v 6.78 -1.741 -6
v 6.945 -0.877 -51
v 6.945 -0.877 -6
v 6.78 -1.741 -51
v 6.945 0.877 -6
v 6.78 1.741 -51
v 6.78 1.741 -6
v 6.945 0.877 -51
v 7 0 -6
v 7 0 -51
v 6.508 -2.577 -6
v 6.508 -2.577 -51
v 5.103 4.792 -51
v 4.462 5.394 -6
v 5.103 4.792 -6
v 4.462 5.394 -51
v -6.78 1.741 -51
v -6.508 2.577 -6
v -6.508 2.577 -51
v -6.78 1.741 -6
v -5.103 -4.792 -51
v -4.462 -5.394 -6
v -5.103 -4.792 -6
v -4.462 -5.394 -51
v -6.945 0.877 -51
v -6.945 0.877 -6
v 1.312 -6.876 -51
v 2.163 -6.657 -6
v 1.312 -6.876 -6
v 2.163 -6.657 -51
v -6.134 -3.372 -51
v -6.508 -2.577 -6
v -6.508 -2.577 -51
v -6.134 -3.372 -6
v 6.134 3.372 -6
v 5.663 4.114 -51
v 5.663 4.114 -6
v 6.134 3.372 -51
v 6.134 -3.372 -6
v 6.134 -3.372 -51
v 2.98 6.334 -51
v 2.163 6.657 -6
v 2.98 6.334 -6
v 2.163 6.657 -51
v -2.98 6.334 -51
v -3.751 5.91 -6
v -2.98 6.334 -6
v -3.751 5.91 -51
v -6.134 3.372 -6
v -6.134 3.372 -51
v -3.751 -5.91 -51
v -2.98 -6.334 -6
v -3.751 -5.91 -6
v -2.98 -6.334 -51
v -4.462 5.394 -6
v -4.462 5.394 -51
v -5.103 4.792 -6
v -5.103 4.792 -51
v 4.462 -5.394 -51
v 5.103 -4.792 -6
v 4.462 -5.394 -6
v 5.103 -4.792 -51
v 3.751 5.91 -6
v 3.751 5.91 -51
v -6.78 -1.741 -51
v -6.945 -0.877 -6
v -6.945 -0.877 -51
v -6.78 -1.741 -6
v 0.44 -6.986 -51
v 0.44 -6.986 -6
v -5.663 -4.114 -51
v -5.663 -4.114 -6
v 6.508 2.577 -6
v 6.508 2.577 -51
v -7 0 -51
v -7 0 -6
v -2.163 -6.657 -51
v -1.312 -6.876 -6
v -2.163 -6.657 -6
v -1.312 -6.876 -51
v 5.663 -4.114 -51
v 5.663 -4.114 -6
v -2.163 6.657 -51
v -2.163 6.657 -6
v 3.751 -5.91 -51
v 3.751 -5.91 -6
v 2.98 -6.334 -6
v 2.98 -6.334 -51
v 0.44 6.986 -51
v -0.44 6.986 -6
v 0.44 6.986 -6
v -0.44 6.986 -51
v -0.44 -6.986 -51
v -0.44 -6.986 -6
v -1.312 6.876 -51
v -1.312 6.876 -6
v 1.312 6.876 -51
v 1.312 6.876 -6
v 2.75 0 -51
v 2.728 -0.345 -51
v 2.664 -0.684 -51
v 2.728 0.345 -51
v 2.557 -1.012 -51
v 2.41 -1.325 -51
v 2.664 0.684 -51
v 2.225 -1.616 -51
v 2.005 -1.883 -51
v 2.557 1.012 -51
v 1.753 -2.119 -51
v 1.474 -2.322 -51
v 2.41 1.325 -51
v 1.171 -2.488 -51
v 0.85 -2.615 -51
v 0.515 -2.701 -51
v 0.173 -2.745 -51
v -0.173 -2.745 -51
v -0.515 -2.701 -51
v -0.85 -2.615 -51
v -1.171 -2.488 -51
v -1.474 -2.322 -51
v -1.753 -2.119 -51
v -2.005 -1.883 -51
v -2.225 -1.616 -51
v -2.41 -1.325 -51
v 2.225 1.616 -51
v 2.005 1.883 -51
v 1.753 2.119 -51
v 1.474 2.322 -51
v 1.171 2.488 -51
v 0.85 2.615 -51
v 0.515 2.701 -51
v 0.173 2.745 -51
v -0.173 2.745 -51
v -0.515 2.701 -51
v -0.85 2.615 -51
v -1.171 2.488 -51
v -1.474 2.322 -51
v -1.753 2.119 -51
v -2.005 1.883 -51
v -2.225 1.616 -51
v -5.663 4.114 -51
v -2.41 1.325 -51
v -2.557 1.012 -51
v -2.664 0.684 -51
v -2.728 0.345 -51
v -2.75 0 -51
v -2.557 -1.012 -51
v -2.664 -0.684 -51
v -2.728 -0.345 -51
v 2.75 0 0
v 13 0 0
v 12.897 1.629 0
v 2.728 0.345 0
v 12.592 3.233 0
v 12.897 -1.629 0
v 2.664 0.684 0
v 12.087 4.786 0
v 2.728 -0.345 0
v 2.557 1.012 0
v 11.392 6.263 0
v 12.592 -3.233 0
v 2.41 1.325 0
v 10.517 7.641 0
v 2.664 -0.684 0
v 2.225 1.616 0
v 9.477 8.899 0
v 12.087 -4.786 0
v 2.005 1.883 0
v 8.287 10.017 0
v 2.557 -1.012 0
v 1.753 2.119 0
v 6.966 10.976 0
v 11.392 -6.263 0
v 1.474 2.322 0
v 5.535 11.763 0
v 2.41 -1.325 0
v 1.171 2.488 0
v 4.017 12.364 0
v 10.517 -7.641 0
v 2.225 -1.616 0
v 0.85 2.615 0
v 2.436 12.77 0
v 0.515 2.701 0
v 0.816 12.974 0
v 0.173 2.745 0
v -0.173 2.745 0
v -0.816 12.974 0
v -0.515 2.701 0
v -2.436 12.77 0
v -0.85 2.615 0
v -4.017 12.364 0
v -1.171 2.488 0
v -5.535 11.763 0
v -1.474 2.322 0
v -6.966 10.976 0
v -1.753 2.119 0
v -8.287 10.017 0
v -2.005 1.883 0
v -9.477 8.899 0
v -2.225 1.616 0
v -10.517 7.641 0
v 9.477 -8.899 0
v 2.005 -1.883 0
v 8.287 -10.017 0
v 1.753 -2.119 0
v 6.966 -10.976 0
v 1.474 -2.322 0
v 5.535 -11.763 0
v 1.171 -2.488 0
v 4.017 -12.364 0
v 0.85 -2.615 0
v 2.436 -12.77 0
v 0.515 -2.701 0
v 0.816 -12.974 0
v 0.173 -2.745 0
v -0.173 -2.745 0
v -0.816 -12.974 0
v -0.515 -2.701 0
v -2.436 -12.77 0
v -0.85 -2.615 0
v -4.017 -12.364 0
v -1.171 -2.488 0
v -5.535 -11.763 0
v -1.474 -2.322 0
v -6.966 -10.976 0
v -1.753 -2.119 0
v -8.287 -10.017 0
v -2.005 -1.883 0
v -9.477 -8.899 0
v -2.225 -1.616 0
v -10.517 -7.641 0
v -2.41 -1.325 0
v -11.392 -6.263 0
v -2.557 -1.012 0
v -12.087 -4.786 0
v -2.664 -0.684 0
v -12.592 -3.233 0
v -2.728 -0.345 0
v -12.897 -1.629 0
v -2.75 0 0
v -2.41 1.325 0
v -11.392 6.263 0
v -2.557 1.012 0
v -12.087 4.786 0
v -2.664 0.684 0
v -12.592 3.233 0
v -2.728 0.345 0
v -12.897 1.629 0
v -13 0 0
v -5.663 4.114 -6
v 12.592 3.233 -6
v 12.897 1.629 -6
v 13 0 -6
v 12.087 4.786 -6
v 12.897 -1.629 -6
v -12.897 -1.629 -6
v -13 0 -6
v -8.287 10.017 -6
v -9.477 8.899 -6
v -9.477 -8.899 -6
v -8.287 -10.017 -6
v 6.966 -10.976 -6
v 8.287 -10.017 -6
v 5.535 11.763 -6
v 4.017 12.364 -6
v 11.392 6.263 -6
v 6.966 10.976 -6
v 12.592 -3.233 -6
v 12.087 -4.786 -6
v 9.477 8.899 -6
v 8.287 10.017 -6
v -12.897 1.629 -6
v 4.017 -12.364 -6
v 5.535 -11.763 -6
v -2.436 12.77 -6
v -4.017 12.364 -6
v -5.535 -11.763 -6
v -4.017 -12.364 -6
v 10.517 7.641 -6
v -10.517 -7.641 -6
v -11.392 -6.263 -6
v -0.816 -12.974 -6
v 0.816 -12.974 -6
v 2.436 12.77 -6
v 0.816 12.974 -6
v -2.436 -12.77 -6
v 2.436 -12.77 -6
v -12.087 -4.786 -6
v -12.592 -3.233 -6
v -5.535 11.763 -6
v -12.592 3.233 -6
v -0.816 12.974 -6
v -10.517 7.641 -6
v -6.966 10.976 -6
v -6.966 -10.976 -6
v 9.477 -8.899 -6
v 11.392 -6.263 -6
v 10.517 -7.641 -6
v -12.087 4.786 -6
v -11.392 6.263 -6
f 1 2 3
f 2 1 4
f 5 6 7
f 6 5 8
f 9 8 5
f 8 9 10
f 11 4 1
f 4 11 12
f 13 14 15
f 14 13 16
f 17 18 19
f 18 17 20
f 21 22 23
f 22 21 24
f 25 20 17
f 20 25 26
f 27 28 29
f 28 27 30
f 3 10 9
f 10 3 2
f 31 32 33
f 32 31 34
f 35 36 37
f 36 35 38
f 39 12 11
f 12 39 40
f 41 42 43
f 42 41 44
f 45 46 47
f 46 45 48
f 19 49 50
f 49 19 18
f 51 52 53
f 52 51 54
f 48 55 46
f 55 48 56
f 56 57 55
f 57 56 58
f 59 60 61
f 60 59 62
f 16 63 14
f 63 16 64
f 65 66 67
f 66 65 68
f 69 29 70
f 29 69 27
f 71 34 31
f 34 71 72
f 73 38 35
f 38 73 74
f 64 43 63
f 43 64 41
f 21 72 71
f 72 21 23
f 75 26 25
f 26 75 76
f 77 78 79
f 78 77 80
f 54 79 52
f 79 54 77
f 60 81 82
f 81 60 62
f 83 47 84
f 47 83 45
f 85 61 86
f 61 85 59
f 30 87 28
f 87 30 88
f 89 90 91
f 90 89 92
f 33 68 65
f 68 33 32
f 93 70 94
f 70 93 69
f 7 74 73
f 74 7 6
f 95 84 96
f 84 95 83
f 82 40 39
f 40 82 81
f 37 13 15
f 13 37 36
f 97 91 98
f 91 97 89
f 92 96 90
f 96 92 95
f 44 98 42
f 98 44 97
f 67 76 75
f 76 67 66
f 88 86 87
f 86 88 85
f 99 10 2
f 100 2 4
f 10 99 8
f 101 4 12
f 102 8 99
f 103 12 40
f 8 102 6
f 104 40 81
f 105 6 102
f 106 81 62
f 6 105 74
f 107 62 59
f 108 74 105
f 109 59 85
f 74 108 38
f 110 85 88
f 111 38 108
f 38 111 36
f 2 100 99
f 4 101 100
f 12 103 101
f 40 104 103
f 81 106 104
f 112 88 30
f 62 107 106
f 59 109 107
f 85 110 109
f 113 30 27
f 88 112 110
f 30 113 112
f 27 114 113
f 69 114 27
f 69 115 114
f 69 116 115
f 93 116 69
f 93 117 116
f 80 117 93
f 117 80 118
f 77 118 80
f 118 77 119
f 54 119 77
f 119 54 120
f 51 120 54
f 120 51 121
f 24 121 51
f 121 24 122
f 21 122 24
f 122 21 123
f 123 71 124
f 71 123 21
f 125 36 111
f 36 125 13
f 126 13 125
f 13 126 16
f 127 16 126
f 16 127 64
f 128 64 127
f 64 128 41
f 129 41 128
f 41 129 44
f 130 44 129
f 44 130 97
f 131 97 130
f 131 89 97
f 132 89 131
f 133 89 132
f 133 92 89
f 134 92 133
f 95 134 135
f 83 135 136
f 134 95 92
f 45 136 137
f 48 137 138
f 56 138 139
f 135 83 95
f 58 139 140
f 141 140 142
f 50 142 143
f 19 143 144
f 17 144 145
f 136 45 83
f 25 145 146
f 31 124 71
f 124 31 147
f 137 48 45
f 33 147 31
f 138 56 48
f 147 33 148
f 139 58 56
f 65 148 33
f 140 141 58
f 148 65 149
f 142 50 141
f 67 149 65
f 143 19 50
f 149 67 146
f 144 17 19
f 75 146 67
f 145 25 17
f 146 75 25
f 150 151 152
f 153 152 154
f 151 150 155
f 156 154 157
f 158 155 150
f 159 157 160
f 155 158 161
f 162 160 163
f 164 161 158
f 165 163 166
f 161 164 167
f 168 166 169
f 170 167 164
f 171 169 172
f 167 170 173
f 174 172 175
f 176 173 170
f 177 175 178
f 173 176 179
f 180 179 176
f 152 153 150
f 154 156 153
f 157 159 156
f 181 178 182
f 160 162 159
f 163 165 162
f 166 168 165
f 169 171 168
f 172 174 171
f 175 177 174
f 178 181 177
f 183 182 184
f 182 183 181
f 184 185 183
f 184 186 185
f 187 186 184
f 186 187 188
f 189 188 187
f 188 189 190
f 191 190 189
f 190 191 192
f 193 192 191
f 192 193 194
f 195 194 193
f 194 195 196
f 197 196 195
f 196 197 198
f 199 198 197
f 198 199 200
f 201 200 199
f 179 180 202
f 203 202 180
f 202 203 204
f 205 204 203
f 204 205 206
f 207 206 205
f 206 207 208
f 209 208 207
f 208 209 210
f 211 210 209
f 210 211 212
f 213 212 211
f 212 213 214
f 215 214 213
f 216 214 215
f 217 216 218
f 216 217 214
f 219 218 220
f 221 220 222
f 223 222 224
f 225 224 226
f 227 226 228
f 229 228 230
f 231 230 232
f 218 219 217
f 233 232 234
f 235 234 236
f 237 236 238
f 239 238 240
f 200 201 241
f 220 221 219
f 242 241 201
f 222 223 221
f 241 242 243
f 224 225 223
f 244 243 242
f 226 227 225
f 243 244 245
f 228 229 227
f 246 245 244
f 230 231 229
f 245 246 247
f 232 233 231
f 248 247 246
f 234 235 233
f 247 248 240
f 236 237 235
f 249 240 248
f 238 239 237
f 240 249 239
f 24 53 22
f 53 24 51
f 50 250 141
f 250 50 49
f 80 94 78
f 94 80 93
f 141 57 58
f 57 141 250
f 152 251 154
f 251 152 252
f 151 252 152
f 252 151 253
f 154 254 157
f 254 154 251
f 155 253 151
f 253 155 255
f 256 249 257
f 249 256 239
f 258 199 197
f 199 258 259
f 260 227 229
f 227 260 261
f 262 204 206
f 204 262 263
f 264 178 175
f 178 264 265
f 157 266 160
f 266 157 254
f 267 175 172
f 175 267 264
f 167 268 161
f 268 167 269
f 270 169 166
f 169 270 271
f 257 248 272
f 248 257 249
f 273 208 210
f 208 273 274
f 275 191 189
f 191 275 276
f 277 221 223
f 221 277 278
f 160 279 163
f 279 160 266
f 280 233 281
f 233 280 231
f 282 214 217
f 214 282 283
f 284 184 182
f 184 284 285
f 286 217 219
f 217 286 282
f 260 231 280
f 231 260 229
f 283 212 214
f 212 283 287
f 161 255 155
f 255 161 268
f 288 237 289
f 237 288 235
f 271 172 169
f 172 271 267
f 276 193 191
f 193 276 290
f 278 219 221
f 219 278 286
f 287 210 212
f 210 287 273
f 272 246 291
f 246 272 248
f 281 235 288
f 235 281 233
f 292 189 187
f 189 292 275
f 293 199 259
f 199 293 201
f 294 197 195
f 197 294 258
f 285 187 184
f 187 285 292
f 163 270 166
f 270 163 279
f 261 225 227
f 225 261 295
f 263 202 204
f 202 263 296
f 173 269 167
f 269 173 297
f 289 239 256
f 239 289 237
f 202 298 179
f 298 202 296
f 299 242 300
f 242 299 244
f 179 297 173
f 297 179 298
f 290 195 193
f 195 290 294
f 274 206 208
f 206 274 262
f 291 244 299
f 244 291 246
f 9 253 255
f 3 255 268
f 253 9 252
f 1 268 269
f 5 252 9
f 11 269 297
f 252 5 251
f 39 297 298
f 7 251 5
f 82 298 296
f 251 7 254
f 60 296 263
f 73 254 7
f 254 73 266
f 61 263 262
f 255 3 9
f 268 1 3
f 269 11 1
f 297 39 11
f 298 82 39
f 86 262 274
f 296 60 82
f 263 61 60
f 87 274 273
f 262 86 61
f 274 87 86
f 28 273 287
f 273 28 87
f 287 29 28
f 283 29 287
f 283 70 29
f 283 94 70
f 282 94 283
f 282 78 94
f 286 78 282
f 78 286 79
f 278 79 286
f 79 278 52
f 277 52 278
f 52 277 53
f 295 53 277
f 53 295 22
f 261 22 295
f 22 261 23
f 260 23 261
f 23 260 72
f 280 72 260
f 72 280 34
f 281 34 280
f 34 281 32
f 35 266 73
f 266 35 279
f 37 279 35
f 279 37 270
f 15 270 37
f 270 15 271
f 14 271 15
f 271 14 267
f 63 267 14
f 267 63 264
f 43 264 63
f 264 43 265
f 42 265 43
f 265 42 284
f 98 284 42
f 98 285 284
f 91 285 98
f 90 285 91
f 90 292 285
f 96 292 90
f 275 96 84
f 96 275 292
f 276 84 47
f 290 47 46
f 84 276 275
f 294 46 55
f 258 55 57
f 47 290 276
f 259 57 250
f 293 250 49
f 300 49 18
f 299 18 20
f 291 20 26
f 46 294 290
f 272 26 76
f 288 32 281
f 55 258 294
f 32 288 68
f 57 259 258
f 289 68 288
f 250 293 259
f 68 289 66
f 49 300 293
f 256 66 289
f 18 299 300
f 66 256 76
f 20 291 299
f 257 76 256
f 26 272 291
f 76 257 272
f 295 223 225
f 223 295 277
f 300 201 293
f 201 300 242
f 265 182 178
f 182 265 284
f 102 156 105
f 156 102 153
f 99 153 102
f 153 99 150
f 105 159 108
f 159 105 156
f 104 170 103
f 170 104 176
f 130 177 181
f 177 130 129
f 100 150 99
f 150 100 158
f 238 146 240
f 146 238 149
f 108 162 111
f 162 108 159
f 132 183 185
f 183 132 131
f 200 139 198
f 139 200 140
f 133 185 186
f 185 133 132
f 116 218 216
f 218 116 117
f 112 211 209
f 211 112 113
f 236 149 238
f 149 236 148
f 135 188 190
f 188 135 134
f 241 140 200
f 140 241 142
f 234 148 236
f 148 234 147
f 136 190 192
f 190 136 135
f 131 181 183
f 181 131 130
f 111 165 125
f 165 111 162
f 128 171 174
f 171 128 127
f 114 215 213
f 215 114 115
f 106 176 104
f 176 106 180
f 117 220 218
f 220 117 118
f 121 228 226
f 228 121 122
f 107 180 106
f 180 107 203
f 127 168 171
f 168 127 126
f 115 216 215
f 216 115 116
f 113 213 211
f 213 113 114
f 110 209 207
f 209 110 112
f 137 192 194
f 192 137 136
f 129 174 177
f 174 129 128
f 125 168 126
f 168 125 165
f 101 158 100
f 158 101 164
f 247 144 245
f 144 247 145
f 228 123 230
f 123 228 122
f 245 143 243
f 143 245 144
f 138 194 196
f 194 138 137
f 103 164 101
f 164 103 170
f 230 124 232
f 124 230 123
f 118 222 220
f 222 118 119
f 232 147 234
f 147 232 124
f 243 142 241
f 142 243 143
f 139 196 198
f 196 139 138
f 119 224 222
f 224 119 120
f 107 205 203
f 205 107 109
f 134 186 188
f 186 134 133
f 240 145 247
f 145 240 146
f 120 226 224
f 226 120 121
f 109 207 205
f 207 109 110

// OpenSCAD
$fn = 50;


difference() {
	union() {
		translate(v = [0, 0, -51.0000000000]) {
			cylinder(h = 51, r = 7.0000000000);
		}
		translate(v = [0, 0, -6.0000000000]) {
			cylinder(h = 6, r = 13.0000000000);
		}
	}
	union() {
		#translate(v = [0, 0, -51]) {
			cylinder(h = 51, r = 2.7500000000);
		}
	}
}
